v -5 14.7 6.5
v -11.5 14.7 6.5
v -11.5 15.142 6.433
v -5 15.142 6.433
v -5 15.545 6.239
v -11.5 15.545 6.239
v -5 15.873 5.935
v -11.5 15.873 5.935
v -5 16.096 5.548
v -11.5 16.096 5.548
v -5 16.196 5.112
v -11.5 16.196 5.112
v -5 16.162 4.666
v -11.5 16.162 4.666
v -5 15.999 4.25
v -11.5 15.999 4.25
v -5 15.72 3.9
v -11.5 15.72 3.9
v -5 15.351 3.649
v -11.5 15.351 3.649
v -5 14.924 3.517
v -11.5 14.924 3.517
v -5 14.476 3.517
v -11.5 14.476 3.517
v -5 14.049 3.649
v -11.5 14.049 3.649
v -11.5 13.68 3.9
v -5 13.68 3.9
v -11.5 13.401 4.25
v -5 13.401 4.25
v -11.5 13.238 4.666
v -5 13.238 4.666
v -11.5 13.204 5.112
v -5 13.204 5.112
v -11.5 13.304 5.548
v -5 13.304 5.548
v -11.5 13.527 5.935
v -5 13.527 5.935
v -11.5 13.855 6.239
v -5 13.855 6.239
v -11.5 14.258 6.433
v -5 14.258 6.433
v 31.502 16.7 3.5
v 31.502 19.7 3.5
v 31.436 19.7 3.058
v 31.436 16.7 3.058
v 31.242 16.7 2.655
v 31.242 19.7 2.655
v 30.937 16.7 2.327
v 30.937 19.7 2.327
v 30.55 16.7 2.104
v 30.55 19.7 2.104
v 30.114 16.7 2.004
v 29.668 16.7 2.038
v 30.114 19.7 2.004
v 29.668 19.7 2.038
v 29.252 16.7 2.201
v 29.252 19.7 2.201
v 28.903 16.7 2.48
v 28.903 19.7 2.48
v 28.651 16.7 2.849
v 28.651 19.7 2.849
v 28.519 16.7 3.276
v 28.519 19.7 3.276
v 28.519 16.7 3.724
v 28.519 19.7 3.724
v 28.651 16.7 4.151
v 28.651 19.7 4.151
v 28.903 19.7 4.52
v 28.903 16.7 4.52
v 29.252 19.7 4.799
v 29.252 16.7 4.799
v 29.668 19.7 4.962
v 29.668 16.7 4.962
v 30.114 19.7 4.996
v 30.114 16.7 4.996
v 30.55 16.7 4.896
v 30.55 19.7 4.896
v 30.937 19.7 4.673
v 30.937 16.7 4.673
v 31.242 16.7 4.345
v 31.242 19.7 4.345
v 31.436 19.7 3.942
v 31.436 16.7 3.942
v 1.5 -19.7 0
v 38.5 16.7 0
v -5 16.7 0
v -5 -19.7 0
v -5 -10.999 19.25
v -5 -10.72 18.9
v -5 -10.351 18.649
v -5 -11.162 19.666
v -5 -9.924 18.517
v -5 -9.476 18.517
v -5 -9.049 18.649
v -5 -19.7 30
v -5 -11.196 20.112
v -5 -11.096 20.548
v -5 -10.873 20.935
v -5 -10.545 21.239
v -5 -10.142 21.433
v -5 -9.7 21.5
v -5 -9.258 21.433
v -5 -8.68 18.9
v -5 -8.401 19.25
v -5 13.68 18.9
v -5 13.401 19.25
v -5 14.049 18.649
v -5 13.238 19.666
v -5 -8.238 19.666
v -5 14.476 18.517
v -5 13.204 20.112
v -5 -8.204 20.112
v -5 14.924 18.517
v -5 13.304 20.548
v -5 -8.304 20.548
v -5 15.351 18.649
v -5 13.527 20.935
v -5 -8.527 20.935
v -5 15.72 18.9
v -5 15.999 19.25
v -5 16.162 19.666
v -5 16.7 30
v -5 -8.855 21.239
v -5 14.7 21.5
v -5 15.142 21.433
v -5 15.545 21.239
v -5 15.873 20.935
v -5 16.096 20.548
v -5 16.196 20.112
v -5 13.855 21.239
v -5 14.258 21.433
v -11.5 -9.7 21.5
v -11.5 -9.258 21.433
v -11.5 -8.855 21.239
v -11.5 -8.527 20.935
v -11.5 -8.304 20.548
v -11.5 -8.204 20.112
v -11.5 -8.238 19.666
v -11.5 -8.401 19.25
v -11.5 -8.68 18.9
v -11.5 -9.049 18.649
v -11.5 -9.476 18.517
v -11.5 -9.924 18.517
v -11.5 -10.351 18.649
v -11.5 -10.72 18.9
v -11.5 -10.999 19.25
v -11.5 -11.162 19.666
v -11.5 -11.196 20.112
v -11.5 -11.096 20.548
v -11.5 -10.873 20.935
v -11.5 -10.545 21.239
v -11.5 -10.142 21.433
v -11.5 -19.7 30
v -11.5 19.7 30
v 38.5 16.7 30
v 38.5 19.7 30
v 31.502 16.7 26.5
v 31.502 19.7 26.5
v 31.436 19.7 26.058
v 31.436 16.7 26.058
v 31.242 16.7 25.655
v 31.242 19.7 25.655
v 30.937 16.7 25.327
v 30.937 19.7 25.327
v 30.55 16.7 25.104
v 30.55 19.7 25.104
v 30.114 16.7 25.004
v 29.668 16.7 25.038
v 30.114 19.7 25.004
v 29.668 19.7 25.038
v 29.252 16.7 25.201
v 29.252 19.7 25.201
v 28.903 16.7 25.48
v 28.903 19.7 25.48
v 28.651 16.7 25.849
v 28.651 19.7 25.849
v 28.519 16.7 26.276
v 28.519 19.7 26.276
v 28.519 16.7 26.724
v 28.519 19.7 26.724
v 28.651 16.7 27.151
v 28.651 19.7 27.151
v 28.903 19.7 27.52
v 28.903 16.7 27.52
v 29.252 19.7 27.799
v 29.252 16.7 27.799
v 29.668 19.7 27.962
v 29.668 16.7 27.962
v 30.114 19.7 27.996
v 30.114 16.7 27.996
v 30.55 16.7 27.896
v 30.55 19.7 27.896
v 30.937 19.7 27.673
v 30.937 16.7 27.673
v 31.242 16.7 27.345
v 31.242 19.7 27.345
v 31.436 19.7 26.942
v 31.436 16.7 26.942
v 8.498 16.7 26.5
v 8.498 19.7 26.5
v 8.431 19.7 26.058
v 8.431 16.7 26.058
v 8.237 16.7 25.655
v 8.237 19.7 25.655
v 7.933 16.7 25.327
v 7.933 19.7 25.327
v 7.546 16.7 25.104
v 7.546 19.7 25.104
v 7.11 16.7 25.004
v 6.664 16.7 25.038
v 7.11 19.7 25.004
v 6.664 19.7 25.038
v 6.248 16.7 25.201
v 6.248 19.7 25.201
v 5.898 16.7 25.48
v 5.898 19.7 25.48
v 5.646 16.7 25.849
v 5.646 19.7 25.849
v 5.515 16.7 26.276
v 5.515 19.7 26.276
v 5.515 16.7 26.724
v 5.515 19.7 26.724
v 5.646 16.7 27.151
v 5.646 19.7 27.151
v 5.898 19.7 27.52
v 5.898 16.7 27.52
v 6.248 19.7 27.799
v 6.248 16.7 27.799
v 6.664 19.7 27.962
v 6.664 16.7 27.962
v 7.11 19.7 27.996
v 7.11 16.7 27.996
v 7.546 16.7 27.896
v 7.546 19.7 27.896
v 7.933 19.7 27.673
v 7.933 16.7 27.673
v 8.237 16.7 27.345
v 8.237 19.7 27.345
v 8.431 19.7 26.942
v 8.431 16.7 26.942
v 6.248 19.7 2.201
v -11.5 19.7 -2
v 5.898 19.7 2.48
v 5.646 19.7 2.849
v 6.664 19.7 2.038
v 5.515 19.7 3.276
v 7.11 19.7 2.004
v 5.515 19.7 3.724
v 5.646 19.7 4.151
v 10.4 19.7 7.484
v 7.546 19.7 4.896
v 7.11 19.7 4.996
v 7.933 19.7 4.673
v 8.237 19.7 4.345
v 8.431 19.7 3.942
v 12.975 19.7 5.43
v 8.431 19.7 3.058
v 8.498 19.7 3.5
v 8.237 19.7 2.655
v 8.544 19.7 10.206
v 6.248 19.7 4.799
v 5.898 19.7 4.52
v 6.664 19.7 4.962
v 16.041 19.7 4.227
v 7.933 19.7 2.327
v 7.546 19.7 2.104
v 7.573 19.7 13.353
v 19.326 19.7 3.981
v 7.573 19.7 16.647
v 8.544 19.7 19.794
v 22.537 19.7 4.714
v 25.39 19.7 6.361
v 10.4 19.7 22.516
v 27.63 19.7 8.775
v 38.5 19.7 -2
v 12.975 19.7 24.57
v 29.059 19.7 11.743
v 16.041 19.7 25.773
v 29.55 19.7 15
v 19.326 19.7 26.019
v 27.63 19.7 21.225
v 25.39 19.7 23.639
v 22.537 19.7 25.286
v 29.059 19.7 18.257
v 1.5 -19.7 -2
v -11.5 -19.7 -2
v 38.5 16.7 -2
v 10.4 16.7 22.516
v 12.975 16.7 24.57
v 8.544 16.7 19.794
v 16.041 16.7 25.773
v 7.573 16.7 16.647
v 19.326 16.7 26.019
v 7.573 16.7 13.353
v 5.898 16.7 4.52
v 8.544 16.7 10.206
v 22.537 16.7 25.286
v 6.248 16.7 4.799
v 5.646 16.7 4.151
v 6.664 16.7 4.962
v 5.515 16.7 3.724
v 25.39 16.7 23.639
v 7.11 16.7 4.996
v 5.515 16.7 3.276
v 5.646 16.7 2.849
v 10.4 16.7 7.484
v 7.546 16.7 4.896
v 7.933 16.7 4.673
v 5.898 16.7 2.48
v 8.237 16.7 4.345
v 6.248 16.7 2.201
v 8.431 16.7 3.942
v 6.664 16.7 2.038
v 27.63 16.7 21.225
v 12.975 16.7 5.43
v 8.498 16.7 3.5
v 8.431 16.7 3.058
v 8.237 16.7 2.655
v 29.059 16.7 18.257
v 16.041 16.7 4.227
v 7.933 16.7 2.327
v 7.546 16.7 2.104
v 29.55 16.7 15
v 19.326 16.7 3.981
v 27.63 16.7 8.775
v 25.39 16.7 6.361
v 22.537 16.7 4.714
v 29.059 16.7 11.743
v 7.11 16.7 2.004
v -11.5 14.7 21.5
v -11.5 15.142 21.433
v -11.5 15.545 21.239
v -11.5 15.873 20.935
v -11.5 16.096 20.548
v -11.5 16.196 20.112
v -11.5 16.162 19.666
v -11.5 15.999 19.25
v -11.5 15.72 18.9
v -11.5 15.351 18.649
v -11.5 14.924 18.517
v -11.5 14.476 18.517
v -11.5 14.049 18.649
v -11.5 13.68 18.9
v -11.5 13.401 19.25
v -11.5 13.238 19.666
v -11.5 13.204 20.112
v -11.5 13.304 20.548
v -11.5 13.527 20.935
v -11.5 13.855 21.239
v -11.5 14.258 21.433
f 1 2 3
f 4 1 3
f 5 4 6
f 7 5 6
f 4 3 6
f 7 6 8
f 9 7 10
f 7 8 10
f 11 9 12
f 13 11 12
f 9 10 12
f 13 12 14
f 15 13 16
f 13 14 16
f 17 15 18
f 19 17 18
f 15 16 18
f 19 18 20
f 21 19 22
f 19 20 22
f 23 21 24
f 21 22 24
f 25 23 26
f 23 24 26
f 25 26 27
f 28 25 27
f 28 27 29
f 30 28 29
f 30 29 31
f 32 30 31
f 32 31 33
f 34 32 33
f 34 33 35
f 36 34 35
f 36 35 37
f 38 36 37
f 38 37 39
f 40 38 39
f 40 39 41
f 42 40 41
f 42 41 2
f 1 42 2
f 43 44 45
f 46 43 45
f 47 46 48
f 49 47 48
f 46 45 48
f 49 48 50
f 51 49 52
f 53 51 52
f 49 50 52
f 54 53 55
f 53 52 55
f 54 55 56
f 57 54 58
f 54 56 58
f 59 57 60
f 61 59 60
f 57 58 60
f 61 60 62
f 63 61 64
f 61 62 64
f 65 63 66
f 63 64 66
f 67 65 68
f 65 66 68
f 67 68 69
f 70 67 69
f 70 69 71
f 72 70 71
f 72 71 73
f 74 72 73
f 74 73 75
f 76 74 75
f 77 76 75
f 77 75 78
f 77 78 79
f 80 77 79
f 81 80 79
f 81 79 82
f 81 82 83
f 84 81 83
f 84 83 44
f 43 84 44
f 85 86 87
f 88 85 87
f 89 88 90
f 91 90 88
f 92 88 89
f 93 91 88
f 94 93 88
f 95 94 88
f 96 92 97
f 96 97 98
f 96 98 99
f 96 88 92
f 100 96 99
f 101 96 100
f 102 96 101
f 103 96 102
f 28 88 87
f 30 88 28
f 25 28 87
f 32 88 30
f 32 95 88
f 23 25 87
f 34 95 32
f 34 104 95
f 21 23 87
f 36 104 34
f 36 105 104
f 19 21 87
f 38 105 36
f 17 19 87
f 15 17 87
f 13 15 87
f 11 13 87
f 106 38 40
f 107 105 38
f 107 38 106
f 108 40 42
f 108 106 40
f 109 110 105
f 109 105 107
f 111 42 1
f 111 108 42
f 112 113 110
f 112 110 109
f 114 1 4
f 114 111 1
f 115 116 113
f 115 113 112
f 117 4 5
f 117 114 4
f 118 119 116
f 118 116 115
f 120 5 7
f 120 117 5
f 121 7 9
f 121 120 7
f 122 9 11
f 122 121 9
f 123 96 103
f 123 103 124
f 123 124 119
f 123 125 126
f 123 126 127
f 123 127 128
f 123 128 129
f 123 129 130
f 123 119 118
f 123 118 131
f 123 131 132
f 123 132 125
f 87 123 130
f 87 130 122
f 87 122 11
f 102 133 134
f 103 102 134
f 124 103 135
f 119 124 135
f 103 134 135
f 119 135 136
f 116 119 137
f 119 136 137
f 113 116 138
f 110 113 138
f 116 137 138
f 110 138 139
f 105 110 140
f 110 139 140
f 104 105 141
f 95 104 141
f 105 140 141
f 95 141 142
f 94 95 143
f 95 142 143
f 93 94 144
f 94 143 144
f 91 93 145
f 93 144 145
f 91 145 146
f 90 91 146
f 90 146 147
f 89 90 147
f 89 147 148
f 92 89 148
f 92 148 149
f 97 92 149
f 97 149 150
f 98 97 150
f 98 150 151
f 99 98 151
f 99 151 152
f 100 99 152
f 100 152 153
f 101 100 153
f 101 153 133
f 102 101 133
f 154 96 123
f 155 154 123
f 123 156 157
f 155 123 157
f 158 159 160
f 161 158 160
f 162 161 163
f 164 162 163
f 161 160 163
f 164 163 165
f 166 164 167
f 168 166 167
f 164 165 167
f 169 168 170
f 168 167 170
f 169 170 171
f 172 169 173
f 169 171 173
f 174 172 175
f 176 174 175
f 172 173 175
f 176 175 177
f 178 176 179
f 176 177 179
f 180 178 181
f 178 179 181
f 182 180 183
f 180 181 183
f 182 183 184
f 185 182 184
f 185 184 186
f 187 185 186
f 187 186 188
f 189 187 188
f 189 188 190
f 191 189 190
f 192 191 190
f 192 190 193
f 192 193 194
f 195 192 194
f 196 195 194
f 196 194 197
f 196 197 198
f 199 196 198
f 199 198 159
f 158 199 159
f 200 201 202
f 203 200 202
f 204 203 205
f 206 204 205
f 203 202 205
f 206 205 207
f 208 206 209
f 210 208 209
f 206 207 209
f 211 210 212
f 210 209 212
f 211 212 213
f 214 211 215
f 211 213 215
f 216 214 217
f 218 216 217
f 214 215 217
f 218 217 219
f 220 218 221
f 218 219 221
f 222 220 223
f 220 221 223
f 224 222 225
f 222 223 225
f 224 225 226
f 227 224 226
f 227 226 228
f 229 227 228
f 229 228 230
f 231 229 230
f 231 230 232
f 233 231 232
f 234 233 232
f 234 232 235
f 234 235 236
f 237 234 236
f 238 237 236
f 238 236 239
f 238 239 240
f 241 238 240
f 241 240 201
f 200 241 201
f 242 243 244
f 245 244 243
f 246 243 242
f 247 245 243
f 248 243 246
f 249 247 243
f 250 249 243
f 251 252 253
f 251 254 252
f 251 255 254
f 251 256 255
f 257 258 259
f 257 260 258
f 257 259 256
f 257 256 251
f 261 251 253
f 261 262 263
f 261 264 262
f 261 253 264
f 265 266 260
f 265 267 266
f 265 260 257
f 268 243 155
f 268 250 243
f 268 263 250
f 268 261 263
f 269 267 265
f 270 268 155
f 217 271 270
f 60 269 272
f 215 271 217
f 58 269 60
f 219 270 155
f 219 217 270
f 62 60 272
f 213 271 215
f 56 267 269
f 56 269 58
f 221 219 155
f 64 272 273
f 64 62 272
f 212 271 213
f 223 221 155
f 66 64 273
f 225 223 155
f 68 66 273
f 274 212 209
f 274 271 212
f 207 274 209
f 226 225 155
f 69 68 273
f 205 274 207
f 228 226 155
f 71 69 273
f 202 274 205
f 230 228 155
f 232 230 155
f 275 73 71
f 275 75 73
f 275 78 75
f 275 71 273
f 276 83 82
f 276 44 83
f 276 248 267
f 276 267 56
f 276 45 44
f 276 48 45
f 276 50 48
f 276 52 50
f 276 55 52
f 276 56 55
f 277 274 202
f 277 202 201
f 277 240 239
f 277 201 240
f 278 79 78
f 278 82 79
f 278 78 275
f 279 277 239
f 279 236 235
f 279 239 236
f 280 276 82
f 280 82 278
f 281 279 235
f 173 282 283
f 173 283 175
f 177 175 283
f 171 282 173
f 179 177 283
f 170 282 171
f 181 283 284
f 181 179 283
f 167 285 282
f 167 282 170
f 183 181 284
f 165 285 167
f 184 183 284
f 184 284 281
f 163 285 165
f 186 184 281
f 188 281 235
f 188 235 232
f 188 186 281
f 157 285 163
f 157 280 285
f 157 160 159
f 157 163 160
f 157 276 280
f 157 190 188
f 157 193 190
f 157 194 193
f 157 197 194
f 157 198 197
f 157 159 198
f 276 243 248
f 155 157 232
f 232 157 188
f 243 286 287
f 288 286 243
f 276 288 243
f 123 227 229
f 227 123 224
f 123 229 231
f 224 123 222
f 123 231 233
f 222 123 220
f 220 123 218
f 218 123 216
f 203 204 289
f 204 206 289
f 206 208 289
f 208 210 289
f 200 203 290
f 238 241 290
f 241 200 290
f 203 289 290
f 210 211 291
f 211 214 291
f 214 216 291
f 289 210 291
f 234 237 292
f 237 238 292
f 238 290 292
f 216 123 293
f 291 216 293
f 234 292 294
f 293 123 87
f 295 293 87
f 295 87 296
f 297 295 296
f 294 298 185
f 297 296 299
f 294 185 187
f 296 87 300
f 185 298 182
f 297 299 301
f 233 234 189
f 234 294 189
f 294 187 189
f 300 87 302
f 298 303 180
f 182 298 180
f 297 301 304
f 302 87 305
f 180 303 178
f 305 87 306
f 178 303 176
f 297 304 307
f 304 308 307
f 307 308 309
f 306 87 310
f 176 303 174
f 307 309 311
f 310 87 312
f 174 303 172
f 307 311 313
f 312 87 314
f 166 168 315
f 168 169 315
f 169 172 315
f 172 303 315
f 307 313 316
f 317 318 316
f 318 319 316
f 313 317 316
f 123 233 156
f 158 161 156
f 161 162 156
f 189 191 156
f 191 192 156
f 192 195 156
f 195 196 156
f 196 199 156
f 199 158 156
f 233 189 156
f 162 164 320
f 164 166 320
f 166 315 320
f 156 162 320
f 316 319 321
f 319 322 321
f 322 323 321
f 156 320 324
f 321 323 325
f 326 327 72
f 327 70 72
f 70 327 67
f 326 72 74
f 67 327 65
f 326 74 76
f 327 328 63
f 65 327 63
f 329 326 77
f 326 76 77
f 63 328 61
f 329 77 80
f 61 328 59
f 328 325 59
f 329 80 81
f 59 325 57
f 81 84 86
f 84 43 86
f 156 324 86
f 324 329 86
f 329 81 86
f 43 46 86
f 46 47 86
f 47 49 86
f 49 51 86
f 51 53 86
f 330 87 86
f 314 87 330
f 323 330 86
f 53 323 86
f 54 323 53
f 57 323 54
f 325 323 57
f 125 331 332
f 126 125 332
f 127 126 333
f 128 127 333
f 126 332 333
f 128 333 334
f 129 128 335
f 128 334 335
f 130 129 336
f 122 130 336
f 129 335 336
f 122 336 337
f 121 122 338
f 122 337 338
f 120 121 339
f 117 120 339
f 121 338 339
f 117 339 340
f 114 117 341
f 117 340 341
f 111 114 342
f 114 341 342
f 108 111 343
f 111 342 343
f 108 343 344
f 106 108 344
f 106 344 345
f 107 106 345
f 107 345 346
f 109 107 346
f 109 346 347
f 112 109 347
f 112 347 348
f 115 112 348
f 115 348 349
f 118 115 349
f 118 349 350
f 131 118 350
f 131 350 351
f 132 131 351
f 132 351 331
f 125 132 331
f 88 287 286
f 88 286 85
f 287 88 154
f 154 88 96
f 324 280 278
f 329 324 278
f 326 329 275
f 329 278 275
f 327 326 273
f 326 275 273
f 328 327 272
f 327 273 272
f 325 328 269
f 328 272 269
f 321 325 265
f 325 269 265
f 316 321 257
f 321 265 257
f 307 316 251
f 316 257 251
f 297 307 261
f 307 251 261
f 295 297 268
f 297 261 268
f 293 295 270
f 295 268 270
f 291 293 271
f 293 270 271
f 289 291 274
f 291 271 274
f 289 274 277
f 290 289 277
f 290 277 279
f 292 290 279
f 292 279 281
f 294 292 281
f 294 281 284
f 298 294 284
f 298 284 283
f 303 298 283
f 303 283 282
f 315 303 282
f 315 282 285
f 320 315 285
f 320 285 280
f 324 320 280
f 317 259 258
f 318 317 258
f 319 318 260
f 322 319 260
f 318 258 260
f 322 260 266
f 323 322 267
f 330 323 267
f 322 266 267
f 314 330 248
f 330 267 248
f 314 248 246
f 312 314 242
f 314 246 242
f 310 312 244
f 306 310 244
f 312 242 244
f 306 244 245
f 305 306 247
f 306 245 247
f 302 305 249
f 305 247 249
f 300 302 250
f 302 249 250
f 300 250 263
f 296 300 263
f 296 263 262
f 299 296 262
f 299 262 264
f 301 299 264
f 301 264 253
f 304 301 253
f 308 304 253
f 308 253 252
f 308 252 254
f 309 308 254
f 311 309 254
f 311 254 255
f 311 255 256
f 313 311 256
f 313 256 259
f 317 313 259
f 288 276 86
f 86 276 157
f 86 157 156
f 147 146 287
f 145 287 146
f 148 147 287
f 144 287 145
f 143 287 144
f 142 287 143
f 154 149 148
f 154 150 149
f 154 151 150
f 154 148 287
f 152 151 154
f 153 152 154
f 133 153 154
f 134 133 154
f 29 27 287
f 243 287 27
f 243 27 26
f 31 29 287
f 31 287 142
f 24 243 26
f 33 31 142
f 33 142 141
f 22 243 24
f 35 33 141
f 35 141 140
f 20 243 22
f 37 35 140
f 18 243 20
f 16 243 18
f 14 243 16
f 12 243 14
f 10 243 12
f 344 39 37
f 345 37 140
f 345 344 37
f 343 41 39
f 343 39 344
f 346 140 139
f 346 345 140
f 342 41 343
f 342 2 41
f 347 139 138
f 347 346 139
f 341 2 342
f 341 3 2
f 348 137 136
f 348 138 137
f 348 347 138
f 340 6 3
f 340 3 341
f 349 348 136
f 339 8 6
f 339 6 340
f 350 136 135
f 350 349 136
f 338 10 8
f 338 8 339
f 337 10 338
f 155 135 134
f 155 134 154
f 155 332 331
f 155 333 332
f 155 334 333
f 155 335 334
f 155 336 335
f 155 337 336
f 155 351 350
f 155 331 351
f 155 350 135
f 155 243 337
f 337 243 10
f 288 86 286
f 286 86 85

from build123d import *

# Parameters (mm, degrees)
CROQUIS1_W              = 3
CROQUIS1_H              = 36.4
CROQUIS1_H_2            = 3
CROQUIS1_W_2            = 37
SALIENTE_EXTRUIR1_DEPTH = 30
CROQUIS3_R              = 11.05
CROQUIS3_R_2            = 1.5
CORTAR_EXTRUIR2_DEPTH   = 30
SALIENTE_EXTRUIR3_DEPTH = 2
CROQUIS8_W              = 32
CROQUIS8_H              = 39.4
SALIENTE_EXTRUIR4_DEPTH = 10
CROQUIS9_W              = 6.5
CROQUIS9_H              = 36.4
CORTAR_EXTRUIR4_DEPTH   = 30
CROQUIS10_R             = 1.5
CORTAR_EXTRUIR5_DEPTH   = 10


with BuildPart() as part:
    # Croquis1 → Saliente-Extruir1 (new body)
    with BuildSketch(Plane.XY):
        with Locations((0, -1.5)):
            Rectangle(CROQUIS1_W, CROQUIS1_H)
        with Locations((0, 18.2)):
            Rectangle(CROQUIS1_W, CROQUIS1_H_2)
        with Locations((20, 18.2)):
            Rectangle(CROQUIS1_W_2, CROQUIS1_H_2)
    extrude(amount=SALIENTE_EXTRUIR1_DEPTH)

    # Croquis3 → Cortar-Extruir2 (cut)
    with BuildSketch(Plane(origin=(0, 19.7, 0), x_dir=(1, 0, 0), z_dir=(0, 1, 0))):
        with Locations((18.5, -15)):
            Circle(CROQUIS3_R)
        with Locations((6.997816512, -26.5)):
            Circle(CROQUIS3_R_2)
        with Locations((30.002183488, -26.5)):
            Circle(CROQUIS3_R_2)
        with Locations((30.002183488, -3.5)):
            Circle(CROQUIS3_R_2)
        with Locations((6.997816512, -3.5)):
            Circle(CROQUIS3_R_2)
    extrude(amount=-CORTAR_EXTRUIR2_DEPTH, mode=Mode.SUBTRACT)

    # Croquis6 → Saliente-Extruir3 (add)
    with BuildSketch(Plane.XY):
        Polygon((-1.5, 19.7), (38.5, 19.7), (38.5, 16.7), (1.5, -19.7), (-1.5, -19.7), align=None)
    extrude(amount=-SALIENTE_EXTRUIR3_DEPTH)

    # Croquis8 → Saliente-Extruir4 (add)
    with BuildSketch(Plane.ZY.offset(1.5)):
        with Locations((14, 0)):
            Rectangle(CROQUIS8_W, CROQUIS8_H)
    extrude(amount=SALIENTE_EXTRUIR4_DEPTH)

    # Croquis9 → Cortar-Extruir4 (cut)
    with BuildSketch(Plane.XY.offset(30)):
        with Locations((-1.75, -1.5)):
            Rectangle(CROQUIS9_W, CROQUIS9_H)
    extrude(amount=-CORTAR_EXTRUIR4_DEPTH, mode=Mode.SUBTRACT)

    # Croquis10 → Cortar-Extruir5 (cut)
    with BuildSketch(Plane.ZY.offset(11.5)):
        with Locations((5, 14.7)):
            Circle(CROQUIS10_R)
        with Locations((20, 14.7)):
            Circle(CROQUIS10_R)
        with Locations((20, -9.7)):
            Circle(CROQUIS10_R)
    extrude(amount=-CORTAR_EXTRUIR5_DEPTH, mode=Mode.SUBTRACT)


solid = part.part
